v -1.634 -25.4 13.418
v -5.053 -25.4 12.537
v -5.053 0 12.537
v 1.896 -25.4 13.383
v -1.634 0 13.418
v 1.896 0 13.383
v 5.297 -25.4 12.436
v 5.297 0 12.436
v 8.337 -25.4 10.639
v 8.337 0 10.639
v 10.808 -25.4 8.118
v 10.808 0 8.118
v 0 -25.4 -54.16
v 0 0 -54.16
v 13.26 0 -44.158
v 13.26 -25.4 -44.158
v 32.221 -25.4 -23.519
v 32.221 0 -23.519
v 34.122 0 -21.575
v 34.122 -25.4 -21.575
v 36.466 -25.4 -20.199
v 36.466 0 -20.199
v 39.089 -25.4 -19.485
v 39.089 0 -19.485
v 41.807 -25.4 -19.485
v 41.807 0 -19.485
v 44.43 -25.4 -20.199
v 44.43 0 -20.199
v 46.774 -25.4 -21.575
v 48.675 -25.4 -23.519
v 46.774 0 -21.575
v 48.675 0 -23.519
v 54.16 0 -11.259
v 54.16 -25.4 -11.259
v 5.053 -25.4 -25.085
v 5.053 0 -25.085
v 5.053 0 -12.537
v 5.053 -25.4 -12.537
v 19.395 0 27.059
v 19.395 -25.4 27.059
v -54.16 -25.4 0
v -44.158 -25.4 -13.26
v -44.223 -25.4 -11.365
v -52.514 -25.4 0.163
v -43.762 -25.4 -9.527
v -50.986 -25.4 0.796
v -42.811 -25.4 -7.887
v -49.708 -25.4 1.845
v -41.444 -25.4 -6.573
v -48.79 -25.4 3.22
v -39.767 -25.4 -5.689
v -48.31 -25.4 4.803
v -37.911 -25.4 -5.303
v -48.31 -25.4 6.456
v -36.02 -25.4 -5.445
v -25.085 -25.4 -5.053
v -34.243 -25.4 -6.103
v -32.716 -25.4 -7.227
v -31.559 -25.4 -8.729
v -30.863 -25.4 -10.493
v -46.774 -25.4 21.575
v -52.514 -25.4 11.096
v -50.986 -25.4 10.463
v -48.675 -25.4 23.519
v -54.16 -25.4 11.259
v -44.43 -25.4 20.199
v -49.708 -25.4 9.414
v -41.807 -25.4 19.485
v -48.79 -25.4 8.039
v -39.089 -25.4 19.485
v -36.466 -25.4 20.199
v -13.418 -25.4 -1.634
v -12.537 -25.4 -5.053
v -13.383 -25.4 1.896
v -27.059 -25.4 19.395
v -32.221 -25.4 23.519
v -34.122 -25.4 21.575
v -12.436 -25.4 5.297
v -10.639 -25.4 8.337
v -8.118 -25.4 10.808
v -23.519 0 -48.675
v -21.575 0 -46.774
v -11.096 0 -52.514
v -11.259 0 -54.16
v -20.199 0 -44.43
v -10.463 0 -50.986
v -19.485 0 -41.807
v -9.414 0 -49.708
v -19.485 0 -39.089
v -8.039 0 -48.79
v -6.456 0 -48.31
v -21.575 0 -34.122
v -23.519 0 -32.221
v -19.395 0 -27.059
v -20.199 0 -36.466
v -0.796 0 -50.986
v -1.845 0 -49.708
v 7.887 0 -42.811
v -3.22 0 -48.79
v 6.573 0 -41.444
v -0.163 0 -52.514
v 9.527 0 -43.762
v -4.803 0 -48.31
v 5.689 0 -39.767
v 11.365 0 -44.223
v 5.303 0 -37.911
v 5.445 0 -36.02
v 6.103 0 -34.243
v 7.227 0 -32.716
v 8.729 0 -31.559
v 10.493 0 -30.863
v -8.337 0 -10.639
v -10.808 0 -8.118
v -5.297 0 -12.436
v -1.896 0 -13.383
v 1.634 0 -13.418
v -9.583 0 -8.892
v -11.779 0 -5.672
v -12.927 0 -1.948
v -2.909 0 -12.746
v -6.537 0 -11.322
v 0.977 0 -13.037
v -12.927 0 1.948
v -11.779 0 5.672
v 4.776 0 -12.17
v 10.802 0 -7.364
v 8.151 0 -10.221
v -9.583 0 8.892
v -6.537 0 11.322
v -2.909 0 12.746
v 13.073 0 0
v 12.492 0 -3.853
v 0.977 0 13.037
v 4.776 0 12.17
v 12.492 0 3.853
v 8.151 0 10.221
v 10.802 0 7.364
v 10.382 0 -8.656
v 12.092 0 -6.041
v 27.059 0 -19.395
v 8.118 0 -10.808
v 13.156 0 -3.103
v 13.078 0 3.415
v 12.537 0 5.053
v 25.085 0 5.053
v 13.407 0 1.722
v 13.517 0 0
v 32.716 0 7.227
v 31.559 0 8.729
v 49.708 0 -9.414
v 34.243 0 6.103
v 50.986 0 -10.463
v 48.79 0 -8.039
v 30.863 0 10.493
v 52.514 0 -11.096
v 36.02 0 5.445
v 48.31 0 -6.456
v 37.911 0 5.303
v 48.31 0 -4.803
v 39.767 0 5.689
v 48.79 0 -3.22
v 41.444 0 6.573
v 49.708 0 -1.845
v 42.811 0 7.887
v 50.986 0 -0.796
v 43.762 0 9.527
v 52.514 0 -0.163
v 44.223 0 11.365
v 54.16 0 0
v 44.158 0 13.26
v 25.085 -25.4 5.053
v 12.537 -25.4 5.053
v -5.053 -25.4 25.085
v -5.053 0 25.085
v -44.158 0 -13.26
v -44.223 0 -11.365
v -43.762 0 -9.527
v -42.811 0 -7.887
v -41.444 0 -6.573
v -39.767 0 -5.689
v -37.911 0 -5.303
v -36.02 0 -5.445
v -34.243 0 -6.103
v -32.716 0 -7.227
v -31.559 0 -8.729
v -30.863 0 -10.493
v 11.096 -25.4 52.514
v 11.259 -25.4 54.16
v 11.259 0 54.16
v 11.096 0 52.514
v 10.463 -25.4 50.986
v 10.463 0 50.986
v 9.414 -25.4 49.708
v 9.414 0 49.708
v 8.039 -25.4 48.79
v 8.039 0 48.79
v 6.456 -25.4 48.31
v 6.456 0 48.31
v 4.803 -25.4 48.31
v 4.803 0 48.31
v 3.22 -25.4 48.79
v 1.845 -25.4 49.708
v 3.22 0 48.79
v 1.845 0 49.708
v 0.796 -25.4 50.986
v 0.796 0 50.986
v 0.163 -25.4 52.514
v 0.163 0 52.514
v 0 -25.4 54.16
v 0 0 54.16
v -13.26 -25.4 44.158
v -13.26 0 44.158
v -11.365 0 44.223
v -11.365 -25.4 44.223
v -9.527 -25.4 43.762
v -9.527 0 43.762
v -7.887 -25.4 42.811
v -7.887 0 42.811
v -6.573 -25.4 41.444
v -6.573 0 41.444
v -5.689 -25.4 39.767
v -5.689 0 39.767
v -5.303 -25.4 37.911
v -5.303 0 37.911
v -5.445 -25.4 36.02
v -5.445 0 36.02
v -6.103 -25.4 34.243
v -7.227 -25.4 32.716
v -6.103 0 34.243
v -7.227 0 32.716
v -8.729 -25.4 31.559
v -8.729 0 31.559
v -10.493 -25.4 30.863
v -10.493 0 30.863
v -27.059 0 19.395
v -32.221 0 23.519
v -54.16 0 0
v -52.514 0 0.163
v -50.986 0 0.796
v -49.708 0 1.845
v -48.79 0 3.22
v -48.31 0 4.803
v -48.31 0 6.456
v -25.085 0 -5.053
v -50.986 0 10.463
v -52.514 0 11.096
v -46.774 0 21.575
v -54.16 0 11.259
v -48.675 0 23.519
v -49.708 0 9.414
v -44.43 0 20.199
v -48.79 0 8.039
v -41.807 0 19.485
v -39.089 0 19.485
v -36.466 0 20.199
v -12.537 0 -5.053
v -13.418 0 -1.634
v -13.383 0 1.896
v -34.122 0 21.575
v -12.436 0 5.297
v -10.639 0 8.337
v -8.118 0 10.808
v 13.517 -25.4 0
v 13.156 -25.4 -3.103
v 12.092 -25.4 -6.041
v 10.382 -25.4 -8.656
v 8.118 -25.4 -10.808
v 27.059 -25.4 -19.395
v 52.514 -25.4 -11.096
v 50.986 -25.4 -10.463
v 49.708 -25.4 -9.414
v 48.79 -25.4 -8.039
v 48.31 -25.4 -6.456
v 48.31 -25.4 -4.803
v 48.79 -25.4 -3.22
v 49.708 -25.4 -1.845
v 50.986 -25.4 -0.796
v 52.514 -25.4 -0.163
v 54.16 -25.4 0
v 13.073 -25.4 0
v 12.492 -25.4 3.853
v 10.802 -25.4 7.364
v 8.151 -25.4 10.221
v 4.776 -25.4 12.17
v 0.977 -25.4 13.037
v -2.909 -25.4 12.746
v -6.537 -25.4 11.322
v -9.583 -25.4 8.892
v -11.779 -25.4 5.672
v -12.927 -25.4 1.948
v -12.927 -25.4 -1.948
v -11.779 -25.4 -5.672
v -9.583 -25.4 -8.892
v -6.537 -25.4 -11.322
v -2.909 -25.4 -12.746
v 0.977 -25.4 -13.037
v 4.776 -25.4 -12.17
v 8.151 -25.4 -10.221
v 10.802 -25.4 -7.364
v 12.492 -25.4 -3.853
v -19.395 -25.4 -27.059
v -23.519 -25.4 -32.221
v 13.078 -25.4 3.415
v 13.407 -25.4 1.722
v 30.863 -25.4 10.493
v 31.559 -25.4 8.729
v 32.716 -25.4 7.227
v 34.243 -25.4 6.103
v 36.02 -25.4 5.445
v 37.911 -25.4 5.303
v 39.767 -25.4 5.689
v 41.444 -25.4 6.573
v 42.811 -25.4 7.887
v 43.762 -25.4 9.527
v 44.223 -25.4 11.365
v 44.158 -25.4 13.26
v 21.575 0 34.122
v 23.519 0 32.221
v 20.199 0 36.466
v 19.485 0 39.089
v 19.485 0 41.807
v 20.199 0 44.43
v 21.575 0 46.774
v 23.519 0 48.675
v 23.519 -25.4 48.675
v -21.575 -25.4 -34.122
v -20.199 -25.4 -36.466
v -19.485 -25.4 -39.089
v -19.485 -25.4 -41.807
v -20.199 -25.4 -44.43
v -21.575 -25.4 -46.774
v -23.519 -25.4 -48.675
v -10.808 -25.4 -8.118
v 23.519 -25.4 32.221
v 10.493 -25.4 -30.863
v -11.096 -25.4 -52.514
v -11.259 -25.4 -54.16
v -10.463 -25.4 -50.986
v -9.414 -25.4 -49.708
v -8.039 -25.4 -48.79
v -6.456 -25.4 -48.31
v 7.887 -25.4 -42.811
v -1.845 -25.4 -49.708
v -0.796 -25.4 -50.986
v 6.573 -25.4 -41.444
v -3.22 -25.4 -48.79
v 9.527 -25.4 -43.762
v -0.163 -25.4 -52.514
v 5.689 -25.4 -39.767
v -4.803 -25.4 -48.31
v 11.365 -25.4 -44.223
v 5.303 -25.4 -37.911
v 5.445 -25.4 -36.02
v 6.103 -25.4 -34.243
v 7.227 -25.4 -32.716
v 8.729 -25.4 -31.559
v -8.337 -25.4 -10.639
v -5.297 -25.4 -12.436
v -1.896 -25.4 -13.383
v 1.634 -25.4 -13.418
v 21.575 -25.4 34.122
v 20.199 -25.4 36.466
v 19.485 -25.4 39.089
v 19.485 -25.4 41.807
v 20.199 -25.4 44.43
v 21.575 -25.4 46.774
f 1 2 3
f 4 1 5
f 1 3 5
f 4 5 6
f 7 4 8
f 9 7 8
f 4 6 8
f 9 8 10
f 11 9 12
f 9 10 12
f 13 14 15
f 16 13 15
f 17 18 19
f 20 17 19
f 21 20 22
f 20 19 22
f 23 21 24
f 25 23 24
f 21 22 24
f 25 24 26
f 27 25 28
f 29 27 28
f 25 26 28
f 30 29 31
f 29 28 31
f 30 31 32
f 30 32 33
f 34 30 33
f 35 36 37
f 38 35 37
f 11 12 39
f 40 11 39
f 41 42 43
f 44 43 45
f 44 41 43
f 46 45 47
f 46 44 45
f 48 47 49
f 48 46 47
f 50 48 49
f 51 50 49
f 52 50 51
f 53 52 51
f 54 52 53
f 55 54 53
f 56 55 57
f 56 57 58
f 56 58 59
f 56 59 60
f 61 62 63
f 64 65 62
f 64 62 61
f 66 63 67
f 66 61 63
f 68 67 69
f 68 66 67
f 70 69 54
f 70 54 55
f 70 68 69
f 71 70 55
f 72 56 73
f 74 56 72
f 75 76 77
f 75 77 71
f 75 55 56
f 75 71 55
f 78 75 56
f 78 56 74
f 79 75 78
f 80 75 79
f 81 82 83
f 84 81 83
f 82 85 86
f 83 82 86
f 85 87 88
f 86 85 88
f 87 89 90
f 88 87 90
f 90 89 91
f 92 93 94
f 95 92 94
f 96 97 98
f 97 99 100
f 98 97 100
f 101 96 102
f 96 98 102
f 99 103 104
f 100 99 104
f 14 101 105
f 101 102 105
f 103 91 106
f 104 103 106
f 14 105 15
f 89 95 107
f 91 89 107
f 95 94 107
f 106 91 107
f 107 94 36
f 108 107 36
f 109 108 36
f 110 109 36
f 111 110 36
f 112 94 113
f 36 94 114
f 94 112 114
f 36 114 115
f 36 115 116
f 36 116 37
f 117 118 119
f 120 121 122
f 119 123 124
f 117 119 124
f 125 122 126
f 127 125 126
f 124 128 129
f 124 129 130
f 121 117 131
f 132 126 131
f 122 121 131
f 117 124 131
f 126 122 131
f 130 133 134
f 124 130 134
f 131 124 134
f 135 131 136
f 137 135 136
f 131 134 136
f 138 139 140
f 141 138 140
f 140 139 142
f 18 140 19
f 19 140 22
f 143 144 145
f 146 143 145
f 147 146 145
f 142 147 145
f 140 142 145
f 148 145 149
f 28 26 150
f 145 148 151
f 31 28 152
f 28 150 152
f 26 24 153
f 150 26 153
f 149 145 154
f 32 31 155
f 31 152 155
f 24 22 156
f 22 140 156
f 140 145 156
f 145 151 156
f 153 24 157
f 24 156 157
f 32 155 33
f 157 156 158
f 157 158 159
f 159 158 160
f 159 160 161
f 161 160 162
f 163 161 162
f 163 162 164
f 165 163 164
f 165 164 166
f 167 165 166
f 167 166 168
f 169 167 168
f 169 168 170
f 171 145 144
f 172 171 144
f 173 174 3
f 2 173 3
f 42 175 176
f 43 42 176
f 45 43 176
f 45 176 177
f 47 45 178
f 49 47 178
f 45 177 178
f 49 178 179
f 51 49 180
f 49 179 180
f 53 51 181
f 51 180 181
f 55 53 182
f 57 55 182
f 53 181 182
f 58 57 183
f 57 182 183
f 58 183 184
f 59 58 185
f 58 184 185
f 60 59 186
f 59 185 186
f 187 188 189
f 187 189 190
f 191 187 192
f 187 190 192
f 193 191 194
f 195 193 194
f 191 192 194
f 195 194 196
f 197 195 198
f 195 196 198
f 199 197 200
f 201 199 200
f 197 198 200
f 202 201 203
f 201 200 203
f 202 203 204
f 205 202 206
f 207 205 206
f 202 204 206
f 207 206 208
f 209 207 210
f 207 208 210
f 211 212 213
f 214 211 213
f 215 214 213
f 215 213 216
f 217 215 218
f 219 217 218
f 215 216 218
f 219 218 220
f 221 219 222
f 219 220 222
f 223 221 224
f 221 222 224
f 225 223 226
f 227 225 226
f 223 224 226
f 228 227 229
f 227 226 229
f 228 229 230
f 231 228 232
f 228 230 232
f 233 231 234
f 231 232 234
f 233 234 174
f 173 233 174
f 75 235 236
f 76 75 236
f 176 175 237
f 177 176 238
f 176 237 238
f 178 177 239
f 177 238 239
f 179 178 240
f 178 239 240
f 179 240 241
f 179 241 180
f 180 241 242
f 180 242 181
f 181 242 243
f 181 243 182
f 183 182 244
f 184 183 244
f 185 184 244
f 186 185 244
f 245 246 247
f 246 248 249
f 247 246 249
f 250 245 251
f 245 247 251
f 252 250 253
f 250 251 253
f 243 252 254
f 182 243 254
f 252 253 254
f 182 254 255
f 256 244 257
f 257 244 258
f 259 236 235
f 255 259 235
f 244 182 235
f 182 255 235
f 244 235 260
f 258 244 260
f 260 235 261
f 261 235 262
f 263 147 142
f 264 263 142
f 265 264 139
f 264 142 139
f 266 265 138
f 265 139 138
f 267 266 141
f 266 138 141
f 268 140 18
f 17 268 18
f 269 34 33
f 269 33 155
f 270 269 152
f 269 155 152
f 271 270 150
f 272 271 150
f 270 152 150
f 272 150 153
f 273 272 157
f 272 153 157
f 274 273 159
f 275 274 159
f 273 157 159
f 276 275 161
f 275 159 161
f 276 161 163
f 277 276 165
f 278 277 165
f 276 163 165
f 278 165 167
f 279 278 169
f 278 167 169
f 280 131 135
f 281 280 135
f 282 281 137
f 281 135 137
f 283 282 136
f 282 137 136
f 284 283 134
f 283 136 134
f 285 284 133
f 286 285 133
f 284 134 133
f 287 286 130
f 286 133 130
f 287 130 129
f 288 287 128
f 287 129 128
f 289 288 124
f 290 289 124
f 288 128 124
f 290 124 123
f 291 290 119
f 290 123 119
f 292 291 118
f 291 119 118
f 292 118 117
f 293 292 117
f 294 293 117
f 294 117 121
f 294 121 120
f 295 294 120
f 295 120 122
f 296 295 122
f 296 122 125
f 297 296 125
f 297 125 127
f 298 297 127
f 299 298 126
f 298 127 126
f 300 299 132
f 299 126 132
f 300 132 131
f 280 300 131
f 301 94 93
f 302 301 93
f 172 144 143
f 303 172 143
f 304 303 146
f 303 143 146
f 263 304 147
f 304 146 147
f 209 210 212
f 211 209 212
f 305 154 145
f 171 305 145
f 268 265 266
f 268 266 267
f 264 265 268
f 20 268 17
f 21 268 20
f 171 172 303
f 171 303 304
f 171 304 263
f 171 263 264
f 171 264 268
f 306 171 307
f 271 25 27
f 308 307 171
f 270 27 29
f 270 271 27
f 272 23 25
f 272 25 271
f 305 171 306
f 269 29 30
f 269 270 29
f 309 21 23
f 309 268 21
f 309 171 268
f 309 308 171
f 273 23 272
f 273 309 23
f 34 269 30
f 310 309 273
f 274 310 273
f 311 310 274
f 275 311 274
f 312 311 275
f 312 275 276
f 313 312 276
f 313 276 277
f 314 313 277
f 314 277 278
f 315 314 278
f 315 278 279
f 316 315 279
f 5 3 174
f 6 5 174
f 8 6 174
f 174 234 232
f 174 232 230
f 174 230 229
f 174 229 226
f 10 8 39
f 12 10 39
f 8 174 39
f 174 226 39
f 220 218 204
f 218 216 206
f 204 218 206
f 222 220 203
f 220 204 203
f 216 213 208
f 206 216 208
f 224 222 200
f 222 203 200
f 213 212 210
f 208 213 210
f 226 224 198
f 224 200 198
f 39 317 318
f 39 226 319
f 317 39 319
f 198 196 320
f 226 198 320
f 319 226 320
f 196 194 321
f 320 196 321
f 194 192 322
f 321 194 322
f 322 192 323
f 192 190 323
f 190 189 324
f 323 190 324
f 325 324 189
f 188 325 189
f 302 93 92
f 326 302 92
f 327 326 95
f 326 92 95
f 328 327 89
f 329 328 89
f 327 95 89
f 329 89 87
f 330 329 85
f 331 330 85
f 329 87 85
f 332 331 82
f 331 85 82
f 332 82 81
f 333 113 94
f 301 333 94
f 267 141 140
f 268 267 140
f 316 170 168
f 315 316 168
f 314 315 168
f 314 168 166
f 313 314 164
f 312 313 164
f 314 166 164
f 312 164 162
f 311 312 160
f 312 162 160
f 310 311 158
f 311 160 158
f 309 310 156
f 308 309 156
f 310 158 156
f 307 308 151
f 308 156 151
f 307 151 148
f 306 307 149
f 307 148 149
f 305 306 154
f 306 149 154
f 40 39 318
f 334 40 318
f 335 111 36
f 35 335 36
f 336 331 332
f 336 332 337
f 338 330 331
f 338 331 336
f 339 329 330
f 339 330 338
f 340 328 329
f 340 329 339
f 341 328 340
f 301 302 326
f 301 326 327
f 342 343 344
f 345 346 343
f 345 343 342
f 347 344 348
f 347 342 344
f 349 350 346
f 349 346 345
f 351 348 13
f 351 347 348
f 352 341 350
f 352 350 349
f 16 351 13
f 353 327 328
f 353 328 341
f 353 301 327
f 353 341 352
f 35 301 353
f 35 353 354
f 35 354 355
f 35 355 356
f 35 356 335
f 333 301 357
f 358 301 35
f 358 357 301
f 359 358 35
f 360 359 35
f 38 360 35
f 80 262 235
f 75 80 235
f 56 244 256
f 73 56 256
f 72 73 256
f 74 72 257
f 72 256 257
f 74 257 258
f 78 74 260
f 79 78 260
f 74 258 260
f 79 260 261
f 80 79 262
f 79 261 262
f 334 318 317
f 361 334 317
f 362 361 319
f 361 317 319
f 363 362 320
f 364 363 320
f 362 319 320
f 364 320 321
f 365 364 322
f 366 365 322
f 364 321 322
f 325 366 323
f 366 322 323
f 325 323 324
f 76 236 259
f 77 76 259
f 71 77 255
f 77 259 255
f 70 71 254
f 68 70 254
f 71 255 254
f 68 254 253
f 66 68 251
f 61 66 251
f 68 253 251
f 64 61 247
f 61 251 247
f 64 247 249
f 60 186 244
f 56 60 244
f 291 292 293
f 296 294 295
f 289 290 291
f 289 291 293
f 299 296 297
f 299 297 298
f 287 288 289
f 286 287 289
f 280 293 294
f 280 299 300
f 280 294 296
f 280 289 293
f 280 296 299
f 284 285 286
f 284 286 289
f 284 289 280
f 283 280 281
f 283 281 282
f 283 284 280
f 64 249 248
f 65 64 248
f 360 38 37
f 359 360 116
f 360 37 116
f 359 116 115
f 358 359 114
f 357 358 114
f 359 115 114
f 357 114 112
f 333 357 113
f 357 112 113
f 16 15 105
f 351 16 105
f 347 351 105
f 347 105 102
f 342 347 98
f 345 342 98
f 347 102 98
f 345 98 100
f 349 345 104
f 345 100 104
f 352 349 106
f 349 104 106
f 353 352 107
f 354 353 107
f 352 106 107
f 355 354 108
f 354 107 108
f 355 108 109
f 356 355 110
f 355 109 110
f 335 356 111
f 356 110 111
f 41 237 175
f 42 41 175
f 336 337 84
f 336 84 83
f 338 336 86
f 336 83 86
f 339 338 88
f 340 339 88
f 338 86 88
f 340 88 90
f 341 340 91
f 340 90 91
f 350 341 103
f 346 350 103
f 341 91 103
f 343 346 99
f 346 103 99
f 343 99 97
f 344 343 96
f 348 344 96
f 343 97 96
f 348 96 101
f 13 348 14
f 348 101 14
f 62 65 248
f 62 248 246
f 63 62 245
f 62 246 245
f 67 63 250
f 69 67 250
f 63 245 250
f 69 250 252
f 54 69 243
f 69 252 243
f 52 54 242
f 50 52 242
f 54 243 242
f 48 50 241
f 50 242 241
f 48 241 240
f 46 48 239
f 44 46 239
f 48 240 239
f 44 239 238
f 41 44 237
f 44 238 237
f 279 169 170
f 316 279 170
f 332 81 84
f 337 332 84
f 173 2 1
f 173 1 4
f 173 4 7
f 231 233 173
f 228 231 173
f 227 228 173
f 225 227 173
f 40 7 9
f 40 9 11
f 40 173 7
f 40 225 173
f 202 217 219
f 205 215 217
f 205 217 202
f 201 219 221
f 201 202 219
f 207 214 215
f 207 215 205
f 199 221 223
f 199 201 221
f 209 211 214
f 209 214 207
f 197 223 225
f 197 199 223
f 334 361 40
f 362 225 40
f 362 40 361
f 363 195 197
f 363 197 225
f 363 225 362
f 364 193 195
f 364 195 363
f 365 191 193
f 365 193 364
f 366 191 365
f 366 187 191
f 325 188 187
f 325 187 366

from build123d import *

# Parameters (mm, degrees)
F1_DEPTH = 25.4
F2_R     = 13.073275
F3_DEPTH = 25.4


with BuildPart() as f1:
    # F0 (on Front) → F1 (new body)
    with BuildSketch(Plane.XZ):
        with BuildLine():
            ThreePointArc((12.536862, 5.052993), (13.269602, 2.573574), (13.516865, 0))
            ThreePointArc((13.516865, 0), (12.091923, -6.040781), (8.11753, -10.80793))
            Line((8.11753, -10.80793), (27.059384, -19.394918))
            Line((27.059384, -19.394918), (32.221321, -23.518622))
            ThreePointArc((32.221321, -23.518622), (40.448155, -19.394918), (48.674989, -23.518622))
            Line((48.674989, -23.518622), (54.159544, -11.259025))
            ThreePointArc((54.159544, -11.259025), (48.24905, -5.629512), (54.159544, 0))
            Line((54.159544, 0), (44.158295, 13.260169))
            ThreePointArc((44.158295, 13.260169), (38.852376, 5.431039), (30.863116, 10.492637))
            Line((30.863116, 10.492637), (25.08549, 5.052993))
            Line((25.08549, 5.052993), (12.536862, 5.052993))
        make_face()
        with BuildLine():
            ThreePointArc((-5.052993, 12.536862), (3.628009, 13.020875), (10.80793, 8.11753))
            Line((10.80793, 8.11753), (19.394918, 27.059384))
            Line((19.394918, 27.059384), (23.518622, 32.221321))
            ThreePointArc((23.518622, 32.221321), (19.394918, 40.448155), (23.518622, 48.674989))
            Line((23.518622, 48.674989), (11.259025, 54.159544))
            ThreePointArc((11.259025, 54.159544), (5.629512, 48.24905), (0, 54.159544))
            Line((0, 54.159544), (-13.260169, 44.158295))
            ThreePointArc((-13.260169, 44.158295), (-5.431039, 38.852376), (-10.492637, 30.863116))
            Line((-10.492637, 30.863116), (-5.052993, 25.08549))
            Line((-5.052993, 25.08549), (-5.052993, 12.536862))
        make_face()
        with BuildLine():
            ThreePointArc((-12.536862, -5.052993), (-13.020875, 3.628009), (-8.11753, 10.80793))
            Line((-8.11753, 10.80793), (-27.059384, 19.394918))
            Line((-27.059384, 19.394918), (-32.221321, 23.518622))
            ThreePointArc((-32.221321, 23.518622), (-40.448155, 19.394918), (-48.674989, 23.518622))
            Line((-48.674989, 23.518622), (-54.159544, 11.259025))
            ThreePointArc((-54.159544, 11.259025), (-48.24905, 5.629512), (-54.159544, 0))
            Line((-54.159544, 0), (-44.158295, -13.260169))
            ThreePointArc((-44.158295, -13.260169), (-38.852376, -5.431039), (-30.863116, -10.492637))
            Line((-30.863116, -10.492637), (-25.08549, -5.052993))
            Line((-25.08549, -5.052993), (-12.536862, -5.052993))
        make_face()
        with BuildLine():
            Line((5.052993, -25.08549), (5.052993, -12.536862))
            ThreePointArc((5.052993, -12.536862), (-3.628009, -13.020875), (-10.80793, -8.11753))
            Line((-10.80793, -8.11753), (-19.394918, -27.059384))
            Line((-19.394918, -27.059384), (-23.518622, -32.221321))
            ThreePointArc((-23.518622, -32.221321), (-19.394918, -40.448155), (-23.518622, -48.674989))
            Line((-23.518622, -48.674989), (-11.259025, -54.159544))
            ThreePointArc((-11.259025, -54.159544), (-5.629512, -48.24905), (0, -54.159544))
            Line((0, -54.159544), (13.260169, -44.158295))
            ThreePointArc((13.260169, -44.158295), (5.431039, -38.852376), (10.492637, -30.863116))
            Line((10.492637, -30.863116), (5.052993, -25.08549))
        make_face()
    extrude(amount=F1_DEPTH)


with BuildPart() as f3:
    # F2 (on Front) → F3 (new body)
    with BuildSketch(Plane.XZ):
        Circle(F2_R)
    extrude(amount=F3_DEPTH)


solid = Compound([f1.part, f3.part])
